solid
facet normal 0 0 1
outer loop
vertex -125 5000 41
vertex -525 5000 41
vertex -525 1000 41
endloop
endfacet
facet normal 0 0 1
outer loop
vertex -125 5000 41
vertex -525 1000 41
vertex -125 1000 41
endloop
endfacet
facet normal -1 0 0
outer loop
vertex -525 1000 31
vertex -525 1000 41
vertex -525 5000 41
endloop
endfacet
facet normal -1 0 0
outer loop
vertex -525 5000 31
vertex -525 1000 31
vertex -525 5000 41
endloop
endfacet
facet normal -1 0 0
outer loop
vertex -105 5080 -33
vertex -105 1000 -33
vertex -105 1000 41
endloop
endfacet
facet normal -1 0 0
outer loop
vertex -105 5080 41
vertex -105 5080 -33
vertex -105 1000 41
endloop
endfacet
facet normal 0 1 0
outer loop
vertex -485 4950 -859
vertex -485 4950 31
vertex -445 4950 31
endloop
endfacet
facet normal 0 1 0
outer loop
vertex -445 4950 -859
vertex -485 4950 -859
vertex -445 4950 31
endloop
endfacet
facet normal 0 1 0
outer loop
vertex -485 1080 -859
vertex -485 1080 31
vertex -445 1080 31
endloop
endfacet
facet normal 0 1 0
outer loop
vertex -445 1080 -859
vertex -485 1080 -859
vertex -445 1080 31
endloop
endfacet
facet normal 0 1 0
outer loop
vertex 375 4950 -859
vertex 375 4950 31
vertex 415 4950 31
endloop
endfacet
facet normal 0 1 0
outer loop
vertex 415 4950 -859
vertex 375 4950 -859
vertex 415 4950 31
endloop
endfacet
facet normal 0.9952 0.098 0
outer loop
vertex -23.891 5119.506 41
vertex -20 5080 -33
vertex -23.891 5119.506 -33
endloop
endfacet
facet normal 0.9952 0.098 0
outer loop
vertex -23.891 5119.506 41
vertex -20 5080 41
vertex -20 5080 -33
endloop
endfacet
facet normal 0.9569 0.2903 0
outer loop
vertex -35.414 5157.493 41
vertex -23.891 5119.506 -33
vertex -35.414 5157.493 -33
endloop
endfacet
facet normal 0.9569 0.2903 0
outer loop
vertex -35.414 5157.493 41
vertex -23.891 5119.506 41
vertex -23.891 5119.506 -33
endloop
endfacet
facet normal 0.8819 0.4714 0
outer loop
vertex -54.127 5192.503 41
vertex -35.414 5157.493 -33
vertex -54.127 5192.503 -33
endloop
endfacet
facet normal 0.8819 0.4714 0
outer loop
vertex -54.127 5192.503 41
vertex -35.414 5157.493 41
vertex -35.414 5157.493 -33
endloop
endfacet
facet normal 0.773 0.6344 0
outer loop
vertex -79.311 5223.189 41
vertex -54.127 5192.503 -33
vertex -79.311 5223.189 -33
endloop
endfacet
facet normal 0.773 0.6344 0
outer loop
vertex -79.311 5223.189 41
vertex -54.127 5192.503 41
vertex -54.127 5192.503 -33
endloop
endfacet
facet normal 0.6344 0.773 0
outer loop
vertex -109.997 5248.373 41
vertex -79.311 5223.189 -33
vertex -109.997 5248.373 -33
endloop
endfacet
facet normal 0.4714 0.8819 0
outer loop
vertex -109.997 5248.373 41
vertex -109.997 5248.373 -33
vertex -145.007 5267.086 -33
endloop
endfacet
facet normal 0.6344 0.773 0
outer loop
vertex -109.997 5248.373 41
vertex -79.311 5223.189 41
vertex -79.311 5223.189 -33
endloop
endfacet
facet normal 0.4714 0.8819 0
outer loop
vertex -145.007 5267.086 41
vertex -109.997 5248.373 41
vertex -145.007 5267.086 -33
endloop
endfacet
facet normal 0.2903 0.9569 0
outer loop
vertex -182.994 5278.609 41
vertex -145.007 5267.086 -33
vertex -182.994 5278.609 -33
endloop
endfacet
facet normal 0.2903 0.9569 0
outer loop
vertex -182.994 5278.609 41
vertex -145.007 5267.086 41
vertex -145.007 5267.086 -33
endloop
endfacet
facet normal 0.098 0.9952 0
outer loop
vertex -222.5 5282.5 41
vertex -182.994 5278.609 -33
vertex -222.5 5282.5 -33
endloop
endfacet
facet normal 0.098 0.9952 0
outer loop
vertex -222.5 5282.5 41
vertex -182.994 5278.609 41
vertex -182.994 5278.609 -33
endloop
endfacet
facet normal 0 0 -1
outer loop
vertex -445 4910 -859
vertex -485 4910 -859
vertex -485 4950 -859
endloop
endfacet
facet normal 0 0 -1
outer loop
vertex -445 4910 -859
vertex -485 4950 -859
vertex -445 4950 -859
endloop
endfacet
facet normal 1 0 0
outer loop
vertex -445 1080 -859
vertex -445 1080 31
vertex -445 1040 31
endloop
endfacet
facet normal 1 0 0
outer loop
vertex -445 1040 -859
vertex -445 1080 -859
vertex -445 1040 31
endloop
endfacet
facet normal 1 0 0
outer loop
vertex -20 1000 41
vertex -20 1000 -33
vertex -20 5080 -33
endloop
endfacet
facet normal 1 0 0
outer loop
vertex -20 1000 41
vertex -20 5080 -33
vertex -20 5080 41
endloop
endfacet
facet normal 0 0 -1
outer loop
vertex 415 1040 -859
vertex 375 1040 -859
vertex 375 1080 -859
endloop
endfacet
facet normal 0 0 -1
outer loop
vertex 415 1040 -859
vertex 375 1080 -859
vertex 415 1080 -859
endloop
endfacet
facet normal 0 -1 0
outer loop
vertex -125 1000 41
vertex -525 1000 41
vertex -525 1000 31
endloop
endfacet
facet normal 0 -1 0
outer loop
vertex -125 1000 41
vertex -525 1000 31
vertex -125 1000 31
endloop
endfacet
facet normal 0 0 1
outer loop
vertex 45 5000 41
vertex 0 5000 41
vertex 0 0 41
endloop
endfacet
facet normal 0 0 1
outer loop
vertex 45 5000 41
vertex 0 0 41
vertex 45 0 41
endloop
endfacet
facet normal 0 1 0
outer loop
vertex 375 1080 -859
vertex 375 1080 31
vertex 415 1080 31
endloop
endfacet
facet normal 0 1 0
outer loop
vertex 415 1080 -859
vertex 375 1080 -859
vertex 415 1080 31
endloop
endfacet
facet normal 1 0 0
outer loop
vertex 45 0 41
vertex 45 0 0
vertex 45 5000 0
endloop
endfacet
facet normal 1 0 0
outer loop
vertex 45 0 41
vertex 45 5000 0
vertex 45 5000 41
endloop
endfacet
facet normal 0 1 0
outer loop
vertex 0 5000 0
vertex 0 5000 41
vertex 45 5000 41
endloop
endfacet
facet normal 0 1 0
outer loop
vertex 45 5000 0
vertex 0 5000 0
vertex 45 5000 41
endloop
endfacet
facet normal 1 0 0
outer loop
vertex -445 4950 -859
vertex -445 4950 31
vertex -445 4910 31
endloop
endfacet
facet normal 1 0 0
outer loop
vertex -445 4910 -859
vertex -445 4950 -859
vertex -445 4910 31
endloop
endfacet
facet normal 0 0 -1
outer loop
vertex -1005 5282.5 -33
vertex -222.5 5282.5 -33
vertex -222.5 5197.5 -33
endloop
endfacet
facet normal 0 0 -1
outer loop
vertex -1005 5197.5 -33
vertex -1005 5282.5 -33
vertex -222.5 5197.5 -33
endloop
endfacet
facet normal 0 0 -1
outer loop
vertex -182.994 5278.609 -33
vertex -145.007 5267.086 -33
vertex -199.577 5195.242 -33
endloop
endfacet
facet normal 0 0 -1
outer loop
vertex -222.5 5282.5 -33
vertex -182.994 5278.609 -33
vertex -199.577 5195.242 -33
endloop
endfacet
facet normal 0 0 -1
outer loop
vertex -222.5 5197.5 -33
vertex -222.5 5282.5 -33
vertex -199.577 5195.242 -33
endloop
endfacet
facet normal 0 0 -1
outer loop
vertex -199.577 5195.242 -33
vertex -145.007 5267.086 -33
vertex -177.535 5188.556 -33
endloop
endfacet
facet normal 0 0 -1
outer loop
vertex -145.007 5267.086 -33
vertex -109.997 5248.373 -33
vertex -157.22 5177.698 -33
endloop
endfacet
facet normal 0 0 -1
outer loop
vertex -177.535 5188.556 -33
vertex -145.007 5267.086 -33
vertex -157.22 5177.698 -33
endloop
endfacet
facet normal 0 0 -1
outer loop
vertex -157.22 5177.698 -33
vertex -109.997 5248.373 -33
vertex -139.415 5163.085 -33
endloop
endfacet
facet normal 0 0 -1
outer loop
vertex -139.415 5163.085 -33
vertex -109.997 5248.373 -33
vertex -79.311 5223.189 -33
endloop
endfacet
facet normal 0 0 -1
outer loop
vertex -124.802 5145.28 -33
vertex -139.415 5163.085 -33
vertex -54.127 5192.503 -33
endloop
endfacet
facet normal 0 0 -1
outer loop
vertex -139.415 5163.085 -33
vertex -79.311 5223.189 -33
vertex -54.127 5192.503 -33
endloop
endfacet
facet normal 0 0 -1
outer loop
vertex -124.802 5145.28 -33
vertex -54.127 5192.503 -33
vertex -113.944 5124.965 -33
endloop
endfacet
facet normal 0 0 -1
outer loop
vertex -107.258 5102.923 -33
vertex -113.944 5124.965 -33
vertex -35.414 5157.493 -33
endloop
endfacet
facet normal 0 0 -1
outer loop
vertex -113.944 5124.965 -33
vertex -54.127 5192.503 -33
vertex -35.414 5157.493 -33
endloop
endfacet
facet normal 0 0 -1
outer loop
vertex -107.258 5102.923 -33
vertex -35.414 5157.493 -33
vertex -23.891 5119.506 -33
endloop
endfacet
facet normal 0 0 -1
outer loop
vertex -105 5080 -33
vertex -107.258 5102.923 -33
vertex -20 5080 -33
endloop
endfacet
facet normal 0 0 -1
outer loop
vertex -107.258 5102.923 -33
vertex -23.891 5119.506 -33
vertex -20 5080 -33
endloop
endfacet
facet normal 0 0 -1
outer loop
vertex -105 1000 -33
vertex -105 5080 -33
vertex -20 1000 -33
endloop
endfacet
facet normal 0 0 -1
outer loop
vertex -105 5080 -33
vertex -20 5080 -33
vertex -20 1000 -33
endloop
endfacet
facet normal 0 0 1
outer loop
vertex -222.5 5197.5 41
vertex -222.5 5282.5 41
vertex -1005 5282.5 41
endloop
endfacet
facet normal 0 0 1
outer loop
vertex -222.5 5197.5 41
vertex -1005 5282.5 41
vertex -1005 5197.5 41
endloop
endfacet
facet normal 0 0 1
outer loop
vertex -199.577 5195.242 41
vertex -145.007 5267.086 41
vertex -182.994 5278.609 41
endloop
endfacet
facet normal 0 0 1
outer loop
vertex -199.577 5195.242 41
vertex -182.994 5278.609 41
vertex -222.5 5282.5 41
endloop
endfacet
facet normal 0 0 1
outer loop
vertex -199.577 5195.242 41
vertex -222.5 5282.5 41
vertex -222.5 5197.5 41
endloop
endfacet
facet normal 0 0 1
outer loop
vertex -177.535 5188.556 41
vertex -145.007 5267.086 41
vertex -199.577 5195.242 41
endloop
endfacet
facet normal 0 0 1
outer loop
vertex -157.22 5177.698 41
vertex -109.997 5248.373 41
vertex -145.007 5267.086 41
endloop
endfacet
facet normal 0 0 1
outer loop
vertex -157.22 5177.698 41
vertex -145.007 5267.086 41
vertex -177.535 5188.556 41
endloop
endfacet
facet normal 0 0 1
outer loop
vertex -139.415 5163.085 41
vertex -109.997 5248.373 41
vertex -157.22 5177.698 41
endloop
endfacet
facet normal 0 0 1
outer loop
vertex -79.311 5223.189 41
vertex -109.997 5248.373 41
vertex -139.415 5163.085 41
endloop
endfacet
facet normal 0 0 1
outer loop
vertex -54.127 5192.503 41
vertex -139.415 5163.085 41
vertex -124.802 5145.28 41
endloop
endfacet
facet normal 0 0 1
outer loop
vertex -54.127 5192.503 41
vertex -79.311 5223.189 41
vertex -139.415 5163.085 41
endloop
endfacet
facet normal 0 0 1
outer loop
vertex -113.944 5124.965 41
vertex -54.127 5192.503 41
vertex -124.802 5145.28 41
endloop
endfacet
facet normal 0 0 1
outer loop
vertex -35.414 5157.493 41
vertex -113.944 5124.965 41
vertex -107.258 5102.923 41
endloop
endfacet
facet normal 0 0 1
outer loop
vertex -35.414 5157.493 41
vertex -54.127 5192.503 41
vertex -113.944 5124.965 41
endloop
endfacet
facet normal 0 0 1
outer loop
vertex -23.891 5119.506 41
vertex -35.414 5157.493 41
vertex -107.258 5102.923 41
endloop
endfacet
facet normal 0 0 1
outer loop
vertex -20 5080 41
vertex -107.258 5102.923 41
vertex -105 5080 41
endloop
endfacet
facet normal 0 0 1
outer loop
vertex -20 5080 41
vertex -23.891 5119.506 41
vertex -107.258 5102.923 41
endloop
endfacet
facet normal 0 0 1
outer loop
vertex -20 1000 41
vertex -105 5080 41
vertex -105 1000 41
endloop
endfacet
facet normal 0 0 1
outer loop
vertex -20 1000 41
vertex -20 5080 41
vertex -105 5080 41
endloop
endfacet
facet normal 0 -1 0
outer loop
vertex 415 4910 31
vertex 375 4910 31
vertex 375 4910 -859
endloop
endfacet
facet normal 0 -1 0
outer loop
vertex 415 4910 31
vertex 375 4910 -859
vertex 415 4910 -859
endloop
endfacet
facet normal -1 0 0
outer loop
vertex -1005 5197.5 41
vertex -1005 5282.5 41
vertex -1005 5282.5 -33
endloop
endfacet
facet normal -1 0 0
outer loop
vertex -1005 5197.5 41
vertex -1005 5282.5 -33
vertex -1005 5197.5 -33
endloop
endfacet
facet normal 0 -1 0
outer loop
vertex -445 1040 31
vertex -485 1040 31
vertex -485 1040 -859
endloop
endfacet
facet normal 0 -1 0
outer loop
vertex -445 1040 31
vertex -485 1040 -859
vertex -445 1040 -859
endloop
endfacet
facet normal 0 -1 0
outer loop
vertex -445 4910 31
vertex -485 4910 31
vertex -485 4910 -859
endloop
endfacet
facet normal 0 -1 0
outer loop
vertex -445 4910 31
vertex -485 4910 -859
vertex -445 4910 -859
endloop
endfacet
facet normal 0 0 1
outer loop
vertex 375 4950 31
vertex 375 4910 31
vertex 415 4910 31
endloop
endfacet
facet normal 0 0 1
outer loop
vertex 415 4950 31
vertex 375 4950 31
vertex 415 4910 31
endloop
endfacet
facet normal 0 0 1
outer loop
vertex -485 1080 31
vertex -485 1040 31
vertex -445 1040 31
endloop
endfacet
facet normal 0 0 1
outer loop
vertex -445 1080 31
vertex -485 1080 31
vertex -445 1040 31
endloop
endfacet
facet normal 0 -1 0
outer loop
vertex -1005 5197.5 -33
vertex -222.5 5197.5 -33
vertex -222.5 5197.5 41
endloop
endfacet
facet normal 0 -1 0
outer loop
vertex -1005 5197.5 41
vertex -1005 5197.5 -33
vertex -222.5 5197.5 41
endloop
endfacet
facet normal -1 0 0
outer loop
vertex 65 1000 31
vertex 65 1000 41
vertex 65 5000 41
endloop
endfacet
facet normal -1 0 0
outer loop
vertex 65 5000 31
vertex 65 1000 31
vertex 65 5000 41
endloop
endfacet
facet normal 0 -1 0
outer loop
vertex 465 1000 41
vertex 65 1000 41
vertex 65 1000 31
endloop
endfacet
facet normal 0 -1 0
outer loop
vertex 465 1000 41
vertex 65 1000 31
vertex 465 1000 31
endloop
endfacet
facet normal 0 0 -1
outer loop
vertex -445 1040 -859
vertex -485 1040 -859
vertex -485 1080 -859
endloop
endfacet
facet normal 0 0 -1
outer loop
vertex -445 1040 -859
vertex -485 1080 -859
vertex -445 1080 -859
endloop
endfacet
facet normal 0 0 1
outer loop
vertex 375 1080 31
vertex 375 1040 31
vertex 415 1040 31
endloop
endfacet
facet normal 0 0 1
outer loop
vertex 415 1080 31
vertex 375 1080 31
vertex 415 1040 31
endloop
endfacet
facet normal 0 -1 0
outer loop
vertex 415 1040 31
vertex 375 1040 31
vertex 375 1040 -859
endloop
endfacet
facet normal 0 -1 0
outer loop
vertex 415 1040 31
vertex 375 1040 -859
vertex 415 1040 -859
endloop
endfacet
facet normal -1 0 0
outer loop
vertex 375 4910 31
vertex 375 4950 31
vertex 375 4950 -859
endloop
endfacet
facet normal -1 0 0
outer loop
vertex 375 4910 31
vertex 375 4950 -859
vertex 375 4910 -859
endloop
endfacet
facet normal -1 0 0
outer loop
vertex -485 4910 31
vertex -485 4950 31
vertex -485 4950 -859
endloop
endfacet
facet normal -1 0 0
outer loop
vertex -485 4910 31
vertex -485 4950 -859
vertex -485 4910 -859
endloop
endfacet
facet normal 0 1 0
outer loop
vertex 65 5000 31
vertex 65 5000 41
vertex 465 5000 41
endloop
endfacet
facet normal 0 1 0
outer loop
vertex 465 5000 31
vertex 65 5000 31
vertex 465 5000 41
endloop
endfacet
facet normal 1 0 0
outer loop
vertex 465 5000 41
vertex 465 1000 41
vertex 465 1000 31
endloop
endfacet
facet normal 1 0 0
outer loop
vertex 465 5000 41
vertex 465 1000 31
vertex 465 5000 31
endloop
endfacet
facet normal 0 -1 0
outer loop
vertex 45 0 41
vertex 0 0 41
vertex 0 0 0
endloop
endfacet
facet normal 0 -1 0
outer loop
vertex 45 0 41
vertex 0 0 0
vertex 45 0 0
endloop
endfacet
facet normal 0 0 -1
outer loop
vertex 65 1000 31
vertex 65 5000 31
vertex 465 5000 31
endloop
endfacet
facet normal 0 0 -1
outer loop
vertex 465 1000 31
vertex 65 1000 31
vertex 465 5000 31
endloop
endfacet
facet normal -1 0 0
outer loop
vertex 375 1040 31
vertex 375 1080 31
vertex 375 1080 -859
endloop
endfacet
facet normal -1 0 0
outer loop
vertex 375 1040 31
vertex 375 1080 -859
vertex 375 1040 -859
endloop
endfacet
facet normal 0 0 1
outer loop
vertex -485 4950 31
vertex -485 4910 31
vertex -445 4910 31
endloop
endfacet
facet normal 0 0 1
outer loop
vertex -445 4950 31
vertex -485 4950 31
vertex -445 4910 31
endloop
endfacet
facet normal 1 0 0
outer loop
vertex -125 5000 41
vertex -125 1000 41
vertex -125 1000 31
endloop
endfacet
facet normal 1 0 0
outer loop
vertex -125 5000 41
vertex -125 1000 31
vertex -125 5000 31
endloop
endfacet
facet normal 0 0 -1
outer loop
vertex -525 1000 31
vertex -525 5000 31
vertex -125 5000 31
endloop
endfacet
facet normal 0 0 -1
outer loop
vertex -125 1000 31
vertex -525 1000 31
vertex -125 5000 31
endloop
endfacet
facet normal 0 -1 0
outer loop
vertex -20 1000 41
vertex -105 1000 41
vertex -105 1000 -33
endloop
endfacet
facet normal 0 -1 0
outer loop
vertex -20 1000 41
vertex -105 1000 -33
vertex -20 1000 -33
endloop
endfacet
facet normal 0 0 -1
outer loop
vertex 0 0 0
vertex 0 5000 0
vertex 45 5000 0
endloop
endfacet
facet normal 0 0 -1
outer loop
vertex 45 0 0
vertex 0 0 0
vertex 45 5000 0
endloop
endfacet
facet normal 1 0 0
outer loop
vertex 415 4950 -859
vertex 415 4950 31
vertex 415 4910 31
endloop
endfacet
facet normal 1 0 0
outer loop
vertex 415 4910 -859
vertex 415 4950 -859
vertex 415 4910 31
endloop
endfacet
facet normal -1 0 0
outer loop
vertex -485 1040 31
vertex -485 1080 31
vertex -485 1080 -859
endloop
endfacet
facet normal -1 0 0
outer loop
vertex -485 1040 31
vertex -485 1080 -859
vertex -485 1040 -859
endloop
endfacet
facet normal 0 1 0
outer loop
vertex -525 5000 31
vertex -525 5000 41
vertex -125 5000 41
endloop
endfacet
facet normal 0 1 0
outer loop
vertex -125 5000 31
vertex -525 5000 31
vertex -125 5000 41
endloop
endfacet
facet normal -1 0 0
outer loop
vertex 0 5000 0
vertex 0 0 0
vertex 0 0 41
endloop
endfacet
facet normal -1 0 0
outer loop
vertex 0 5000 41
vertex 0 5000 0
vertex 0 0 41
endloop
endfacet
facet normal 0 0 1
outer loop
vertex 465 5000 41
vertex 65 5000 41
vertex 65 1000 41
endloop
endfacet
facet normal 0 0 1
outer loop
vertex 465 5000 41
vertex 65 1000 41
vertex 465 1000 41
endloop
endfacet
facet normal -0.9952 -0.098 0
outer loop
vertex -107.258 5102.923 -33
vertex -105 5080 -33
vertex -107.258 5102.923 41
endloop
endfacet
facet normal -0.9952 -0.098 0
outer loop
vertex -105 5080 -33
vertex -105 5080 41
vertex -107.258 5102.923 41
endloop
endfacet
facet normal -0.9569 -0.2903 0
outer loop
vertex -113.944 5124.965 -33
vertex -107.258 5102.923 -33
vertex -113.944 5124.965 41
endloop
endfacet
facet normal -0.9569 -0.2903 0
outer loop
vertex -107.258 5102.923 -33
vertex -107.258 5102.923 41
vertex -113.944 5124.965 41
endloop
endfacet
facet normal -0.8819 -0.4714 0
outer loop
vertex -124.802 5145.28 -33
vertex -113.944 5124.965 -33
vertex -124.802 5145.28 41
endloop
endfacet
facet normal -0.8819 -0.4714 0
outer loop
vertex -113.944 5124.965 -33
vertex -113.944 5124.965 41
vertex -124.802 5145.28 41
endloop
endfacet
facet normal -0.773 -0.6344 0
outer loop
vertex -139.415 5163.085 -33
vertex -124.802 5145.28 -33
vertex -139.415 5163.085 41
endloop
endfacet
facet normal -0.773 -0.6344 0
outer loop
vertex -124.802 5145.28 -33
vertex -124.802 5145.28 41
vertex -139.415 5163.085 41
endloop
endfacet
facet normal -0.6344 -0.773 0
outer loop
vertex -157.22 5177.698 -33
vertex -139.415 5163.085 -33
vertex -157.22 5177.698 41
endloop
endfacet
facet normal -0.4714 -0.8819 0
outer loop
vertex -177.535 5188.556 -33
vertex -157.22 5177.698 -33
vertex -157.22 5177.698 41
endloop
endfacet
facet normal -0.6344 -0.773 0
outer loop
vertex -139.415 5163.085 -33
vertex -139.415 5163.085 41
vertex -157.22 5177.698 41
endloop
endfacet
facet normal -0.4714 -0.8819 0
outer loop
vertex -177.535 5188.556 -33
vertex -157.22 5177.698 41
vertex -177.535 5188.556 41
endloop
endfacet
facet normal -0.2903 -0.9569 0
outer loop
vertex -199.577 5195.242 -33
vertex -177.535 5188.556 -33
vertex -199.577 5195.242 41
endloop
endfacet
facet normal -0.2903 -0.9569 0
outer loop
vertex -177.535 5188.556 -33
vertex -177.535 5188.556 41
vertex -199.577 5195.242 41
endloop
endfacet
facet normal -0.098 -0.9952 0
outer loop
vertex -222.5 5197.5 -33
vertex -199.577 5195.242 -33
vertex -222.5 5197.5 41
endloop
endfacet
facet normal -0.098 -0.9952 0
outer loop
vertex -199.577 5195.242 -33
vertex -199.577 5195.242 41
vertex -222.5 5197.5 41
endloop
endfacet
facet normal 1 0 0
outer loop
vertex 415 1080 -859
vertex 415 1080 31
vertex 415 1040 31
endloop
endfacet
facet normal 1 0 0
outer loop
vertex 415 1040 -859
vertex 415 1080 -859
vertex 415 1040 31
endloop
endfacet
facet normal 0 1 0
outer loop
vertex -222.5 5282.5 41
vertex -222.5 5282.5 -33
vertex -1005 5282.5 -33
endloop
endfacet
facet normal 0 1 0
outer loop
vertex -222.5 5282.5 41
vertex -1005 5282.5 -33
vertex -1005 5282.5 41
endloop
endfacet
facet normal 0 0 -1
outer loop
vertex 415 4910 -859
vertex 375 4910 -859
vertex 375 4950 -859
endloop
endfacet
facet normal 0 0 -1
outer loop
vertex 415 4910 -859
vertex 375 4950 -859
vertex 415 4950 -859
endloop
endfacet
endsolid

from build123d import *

# Parameters (mm, degrees)
F0_W      = 45
F0_H      = 41
F1_DEPTH  = 5000
F3_W      = 85
F3_H      = 74
F4_DEPTH  = 4080
F5_W      = 85
F5_H      = 74
F6_ANGLE  = -90
F7_W      = 85
F7_H      = 74
F8_DEPTH  = 782.5
F9_W      = 400
F9_H      = 4000
F10_DEPTH = 10
F11_W     = 40
F11_H     = 40
F12_DEPTH = 890


with BuildPart() as f1:
    # F0 (on Front) → F1 (new body)
    with BuildSketch(Plane.XZ):
        with Locations((22.5, 20.5)):
            Rectangle(F0_W, F0_H)
    extrude(amount=-F1_DEPTH)


with BuildPart() as f4:
    # F3 (on offset) → F4 (new body)
    with BuildSketch(Plane.XZ.offset(-1000)):
        with Locations((-62.5, 4)):
            Rectangle(F3_W, F3_H)
    extrude(amount=-F4_DEPTH)

    # F5 (on face) → F6 (revolve)
    with BuildSketch(Plane(origin=(0, 5080, 0), x_dir=(-1, 0, 0), z_dir=(0, 1, 0))):
        with Locations((62.5, 4)):
            Rectangle(F5_W, F5_H)
    revolve(axis=Axis((-222.5, 5080, 11.201847), (0, 0, -1)), revolution_arc=F6_ANGLE)

    # F7 (on face) → F8 (join)
    with BuildSketch(Plane(origin=(-222.5, 0, 0), x_dir=(0, -1, 0), z_dir=(-1, 0, 0))):
        with Locations((-5240, 4)):
            Rectangle(F7_W, F7_H)
    extrude(amount=F8_DEPTH)


with BuildPart() as f10:
    # F9 (on face) → F10 (new body)
    with BuildSketch(Plane.XY.offset(41)):
        with Locations((-325, 3000)):
            Rectangle(F9_W, F9_H)
        with Locations((265, 3000)):
            Rectangle(F9_W, F9_H)
    extrude(amount=-F10_DEPTH)


with BuildPart() as f12:
    # F11 (on face) → F12 (new body)
    with BuildSketch(Plane(origin=(0, 0, 31), x_dir=(1, 0, 0), z_dir=(0, 0, -1))):
        with Locations((-465, -4930)):
            Rectangle(F11_W, F11_H)
        with Locations((395, -4930)):
            Rectangle(F11_W, F11_H)
        with Locations((395, -1060)):
            Rectangle(F11_W, F11_H)
        with Locations((-465, -1060)):
            Rectangle(F11_W, F11_H)
    extrude(amount=F12_DEPTH)


solid = Compound([f1.part, f4.part, f10.part, f12.part])
